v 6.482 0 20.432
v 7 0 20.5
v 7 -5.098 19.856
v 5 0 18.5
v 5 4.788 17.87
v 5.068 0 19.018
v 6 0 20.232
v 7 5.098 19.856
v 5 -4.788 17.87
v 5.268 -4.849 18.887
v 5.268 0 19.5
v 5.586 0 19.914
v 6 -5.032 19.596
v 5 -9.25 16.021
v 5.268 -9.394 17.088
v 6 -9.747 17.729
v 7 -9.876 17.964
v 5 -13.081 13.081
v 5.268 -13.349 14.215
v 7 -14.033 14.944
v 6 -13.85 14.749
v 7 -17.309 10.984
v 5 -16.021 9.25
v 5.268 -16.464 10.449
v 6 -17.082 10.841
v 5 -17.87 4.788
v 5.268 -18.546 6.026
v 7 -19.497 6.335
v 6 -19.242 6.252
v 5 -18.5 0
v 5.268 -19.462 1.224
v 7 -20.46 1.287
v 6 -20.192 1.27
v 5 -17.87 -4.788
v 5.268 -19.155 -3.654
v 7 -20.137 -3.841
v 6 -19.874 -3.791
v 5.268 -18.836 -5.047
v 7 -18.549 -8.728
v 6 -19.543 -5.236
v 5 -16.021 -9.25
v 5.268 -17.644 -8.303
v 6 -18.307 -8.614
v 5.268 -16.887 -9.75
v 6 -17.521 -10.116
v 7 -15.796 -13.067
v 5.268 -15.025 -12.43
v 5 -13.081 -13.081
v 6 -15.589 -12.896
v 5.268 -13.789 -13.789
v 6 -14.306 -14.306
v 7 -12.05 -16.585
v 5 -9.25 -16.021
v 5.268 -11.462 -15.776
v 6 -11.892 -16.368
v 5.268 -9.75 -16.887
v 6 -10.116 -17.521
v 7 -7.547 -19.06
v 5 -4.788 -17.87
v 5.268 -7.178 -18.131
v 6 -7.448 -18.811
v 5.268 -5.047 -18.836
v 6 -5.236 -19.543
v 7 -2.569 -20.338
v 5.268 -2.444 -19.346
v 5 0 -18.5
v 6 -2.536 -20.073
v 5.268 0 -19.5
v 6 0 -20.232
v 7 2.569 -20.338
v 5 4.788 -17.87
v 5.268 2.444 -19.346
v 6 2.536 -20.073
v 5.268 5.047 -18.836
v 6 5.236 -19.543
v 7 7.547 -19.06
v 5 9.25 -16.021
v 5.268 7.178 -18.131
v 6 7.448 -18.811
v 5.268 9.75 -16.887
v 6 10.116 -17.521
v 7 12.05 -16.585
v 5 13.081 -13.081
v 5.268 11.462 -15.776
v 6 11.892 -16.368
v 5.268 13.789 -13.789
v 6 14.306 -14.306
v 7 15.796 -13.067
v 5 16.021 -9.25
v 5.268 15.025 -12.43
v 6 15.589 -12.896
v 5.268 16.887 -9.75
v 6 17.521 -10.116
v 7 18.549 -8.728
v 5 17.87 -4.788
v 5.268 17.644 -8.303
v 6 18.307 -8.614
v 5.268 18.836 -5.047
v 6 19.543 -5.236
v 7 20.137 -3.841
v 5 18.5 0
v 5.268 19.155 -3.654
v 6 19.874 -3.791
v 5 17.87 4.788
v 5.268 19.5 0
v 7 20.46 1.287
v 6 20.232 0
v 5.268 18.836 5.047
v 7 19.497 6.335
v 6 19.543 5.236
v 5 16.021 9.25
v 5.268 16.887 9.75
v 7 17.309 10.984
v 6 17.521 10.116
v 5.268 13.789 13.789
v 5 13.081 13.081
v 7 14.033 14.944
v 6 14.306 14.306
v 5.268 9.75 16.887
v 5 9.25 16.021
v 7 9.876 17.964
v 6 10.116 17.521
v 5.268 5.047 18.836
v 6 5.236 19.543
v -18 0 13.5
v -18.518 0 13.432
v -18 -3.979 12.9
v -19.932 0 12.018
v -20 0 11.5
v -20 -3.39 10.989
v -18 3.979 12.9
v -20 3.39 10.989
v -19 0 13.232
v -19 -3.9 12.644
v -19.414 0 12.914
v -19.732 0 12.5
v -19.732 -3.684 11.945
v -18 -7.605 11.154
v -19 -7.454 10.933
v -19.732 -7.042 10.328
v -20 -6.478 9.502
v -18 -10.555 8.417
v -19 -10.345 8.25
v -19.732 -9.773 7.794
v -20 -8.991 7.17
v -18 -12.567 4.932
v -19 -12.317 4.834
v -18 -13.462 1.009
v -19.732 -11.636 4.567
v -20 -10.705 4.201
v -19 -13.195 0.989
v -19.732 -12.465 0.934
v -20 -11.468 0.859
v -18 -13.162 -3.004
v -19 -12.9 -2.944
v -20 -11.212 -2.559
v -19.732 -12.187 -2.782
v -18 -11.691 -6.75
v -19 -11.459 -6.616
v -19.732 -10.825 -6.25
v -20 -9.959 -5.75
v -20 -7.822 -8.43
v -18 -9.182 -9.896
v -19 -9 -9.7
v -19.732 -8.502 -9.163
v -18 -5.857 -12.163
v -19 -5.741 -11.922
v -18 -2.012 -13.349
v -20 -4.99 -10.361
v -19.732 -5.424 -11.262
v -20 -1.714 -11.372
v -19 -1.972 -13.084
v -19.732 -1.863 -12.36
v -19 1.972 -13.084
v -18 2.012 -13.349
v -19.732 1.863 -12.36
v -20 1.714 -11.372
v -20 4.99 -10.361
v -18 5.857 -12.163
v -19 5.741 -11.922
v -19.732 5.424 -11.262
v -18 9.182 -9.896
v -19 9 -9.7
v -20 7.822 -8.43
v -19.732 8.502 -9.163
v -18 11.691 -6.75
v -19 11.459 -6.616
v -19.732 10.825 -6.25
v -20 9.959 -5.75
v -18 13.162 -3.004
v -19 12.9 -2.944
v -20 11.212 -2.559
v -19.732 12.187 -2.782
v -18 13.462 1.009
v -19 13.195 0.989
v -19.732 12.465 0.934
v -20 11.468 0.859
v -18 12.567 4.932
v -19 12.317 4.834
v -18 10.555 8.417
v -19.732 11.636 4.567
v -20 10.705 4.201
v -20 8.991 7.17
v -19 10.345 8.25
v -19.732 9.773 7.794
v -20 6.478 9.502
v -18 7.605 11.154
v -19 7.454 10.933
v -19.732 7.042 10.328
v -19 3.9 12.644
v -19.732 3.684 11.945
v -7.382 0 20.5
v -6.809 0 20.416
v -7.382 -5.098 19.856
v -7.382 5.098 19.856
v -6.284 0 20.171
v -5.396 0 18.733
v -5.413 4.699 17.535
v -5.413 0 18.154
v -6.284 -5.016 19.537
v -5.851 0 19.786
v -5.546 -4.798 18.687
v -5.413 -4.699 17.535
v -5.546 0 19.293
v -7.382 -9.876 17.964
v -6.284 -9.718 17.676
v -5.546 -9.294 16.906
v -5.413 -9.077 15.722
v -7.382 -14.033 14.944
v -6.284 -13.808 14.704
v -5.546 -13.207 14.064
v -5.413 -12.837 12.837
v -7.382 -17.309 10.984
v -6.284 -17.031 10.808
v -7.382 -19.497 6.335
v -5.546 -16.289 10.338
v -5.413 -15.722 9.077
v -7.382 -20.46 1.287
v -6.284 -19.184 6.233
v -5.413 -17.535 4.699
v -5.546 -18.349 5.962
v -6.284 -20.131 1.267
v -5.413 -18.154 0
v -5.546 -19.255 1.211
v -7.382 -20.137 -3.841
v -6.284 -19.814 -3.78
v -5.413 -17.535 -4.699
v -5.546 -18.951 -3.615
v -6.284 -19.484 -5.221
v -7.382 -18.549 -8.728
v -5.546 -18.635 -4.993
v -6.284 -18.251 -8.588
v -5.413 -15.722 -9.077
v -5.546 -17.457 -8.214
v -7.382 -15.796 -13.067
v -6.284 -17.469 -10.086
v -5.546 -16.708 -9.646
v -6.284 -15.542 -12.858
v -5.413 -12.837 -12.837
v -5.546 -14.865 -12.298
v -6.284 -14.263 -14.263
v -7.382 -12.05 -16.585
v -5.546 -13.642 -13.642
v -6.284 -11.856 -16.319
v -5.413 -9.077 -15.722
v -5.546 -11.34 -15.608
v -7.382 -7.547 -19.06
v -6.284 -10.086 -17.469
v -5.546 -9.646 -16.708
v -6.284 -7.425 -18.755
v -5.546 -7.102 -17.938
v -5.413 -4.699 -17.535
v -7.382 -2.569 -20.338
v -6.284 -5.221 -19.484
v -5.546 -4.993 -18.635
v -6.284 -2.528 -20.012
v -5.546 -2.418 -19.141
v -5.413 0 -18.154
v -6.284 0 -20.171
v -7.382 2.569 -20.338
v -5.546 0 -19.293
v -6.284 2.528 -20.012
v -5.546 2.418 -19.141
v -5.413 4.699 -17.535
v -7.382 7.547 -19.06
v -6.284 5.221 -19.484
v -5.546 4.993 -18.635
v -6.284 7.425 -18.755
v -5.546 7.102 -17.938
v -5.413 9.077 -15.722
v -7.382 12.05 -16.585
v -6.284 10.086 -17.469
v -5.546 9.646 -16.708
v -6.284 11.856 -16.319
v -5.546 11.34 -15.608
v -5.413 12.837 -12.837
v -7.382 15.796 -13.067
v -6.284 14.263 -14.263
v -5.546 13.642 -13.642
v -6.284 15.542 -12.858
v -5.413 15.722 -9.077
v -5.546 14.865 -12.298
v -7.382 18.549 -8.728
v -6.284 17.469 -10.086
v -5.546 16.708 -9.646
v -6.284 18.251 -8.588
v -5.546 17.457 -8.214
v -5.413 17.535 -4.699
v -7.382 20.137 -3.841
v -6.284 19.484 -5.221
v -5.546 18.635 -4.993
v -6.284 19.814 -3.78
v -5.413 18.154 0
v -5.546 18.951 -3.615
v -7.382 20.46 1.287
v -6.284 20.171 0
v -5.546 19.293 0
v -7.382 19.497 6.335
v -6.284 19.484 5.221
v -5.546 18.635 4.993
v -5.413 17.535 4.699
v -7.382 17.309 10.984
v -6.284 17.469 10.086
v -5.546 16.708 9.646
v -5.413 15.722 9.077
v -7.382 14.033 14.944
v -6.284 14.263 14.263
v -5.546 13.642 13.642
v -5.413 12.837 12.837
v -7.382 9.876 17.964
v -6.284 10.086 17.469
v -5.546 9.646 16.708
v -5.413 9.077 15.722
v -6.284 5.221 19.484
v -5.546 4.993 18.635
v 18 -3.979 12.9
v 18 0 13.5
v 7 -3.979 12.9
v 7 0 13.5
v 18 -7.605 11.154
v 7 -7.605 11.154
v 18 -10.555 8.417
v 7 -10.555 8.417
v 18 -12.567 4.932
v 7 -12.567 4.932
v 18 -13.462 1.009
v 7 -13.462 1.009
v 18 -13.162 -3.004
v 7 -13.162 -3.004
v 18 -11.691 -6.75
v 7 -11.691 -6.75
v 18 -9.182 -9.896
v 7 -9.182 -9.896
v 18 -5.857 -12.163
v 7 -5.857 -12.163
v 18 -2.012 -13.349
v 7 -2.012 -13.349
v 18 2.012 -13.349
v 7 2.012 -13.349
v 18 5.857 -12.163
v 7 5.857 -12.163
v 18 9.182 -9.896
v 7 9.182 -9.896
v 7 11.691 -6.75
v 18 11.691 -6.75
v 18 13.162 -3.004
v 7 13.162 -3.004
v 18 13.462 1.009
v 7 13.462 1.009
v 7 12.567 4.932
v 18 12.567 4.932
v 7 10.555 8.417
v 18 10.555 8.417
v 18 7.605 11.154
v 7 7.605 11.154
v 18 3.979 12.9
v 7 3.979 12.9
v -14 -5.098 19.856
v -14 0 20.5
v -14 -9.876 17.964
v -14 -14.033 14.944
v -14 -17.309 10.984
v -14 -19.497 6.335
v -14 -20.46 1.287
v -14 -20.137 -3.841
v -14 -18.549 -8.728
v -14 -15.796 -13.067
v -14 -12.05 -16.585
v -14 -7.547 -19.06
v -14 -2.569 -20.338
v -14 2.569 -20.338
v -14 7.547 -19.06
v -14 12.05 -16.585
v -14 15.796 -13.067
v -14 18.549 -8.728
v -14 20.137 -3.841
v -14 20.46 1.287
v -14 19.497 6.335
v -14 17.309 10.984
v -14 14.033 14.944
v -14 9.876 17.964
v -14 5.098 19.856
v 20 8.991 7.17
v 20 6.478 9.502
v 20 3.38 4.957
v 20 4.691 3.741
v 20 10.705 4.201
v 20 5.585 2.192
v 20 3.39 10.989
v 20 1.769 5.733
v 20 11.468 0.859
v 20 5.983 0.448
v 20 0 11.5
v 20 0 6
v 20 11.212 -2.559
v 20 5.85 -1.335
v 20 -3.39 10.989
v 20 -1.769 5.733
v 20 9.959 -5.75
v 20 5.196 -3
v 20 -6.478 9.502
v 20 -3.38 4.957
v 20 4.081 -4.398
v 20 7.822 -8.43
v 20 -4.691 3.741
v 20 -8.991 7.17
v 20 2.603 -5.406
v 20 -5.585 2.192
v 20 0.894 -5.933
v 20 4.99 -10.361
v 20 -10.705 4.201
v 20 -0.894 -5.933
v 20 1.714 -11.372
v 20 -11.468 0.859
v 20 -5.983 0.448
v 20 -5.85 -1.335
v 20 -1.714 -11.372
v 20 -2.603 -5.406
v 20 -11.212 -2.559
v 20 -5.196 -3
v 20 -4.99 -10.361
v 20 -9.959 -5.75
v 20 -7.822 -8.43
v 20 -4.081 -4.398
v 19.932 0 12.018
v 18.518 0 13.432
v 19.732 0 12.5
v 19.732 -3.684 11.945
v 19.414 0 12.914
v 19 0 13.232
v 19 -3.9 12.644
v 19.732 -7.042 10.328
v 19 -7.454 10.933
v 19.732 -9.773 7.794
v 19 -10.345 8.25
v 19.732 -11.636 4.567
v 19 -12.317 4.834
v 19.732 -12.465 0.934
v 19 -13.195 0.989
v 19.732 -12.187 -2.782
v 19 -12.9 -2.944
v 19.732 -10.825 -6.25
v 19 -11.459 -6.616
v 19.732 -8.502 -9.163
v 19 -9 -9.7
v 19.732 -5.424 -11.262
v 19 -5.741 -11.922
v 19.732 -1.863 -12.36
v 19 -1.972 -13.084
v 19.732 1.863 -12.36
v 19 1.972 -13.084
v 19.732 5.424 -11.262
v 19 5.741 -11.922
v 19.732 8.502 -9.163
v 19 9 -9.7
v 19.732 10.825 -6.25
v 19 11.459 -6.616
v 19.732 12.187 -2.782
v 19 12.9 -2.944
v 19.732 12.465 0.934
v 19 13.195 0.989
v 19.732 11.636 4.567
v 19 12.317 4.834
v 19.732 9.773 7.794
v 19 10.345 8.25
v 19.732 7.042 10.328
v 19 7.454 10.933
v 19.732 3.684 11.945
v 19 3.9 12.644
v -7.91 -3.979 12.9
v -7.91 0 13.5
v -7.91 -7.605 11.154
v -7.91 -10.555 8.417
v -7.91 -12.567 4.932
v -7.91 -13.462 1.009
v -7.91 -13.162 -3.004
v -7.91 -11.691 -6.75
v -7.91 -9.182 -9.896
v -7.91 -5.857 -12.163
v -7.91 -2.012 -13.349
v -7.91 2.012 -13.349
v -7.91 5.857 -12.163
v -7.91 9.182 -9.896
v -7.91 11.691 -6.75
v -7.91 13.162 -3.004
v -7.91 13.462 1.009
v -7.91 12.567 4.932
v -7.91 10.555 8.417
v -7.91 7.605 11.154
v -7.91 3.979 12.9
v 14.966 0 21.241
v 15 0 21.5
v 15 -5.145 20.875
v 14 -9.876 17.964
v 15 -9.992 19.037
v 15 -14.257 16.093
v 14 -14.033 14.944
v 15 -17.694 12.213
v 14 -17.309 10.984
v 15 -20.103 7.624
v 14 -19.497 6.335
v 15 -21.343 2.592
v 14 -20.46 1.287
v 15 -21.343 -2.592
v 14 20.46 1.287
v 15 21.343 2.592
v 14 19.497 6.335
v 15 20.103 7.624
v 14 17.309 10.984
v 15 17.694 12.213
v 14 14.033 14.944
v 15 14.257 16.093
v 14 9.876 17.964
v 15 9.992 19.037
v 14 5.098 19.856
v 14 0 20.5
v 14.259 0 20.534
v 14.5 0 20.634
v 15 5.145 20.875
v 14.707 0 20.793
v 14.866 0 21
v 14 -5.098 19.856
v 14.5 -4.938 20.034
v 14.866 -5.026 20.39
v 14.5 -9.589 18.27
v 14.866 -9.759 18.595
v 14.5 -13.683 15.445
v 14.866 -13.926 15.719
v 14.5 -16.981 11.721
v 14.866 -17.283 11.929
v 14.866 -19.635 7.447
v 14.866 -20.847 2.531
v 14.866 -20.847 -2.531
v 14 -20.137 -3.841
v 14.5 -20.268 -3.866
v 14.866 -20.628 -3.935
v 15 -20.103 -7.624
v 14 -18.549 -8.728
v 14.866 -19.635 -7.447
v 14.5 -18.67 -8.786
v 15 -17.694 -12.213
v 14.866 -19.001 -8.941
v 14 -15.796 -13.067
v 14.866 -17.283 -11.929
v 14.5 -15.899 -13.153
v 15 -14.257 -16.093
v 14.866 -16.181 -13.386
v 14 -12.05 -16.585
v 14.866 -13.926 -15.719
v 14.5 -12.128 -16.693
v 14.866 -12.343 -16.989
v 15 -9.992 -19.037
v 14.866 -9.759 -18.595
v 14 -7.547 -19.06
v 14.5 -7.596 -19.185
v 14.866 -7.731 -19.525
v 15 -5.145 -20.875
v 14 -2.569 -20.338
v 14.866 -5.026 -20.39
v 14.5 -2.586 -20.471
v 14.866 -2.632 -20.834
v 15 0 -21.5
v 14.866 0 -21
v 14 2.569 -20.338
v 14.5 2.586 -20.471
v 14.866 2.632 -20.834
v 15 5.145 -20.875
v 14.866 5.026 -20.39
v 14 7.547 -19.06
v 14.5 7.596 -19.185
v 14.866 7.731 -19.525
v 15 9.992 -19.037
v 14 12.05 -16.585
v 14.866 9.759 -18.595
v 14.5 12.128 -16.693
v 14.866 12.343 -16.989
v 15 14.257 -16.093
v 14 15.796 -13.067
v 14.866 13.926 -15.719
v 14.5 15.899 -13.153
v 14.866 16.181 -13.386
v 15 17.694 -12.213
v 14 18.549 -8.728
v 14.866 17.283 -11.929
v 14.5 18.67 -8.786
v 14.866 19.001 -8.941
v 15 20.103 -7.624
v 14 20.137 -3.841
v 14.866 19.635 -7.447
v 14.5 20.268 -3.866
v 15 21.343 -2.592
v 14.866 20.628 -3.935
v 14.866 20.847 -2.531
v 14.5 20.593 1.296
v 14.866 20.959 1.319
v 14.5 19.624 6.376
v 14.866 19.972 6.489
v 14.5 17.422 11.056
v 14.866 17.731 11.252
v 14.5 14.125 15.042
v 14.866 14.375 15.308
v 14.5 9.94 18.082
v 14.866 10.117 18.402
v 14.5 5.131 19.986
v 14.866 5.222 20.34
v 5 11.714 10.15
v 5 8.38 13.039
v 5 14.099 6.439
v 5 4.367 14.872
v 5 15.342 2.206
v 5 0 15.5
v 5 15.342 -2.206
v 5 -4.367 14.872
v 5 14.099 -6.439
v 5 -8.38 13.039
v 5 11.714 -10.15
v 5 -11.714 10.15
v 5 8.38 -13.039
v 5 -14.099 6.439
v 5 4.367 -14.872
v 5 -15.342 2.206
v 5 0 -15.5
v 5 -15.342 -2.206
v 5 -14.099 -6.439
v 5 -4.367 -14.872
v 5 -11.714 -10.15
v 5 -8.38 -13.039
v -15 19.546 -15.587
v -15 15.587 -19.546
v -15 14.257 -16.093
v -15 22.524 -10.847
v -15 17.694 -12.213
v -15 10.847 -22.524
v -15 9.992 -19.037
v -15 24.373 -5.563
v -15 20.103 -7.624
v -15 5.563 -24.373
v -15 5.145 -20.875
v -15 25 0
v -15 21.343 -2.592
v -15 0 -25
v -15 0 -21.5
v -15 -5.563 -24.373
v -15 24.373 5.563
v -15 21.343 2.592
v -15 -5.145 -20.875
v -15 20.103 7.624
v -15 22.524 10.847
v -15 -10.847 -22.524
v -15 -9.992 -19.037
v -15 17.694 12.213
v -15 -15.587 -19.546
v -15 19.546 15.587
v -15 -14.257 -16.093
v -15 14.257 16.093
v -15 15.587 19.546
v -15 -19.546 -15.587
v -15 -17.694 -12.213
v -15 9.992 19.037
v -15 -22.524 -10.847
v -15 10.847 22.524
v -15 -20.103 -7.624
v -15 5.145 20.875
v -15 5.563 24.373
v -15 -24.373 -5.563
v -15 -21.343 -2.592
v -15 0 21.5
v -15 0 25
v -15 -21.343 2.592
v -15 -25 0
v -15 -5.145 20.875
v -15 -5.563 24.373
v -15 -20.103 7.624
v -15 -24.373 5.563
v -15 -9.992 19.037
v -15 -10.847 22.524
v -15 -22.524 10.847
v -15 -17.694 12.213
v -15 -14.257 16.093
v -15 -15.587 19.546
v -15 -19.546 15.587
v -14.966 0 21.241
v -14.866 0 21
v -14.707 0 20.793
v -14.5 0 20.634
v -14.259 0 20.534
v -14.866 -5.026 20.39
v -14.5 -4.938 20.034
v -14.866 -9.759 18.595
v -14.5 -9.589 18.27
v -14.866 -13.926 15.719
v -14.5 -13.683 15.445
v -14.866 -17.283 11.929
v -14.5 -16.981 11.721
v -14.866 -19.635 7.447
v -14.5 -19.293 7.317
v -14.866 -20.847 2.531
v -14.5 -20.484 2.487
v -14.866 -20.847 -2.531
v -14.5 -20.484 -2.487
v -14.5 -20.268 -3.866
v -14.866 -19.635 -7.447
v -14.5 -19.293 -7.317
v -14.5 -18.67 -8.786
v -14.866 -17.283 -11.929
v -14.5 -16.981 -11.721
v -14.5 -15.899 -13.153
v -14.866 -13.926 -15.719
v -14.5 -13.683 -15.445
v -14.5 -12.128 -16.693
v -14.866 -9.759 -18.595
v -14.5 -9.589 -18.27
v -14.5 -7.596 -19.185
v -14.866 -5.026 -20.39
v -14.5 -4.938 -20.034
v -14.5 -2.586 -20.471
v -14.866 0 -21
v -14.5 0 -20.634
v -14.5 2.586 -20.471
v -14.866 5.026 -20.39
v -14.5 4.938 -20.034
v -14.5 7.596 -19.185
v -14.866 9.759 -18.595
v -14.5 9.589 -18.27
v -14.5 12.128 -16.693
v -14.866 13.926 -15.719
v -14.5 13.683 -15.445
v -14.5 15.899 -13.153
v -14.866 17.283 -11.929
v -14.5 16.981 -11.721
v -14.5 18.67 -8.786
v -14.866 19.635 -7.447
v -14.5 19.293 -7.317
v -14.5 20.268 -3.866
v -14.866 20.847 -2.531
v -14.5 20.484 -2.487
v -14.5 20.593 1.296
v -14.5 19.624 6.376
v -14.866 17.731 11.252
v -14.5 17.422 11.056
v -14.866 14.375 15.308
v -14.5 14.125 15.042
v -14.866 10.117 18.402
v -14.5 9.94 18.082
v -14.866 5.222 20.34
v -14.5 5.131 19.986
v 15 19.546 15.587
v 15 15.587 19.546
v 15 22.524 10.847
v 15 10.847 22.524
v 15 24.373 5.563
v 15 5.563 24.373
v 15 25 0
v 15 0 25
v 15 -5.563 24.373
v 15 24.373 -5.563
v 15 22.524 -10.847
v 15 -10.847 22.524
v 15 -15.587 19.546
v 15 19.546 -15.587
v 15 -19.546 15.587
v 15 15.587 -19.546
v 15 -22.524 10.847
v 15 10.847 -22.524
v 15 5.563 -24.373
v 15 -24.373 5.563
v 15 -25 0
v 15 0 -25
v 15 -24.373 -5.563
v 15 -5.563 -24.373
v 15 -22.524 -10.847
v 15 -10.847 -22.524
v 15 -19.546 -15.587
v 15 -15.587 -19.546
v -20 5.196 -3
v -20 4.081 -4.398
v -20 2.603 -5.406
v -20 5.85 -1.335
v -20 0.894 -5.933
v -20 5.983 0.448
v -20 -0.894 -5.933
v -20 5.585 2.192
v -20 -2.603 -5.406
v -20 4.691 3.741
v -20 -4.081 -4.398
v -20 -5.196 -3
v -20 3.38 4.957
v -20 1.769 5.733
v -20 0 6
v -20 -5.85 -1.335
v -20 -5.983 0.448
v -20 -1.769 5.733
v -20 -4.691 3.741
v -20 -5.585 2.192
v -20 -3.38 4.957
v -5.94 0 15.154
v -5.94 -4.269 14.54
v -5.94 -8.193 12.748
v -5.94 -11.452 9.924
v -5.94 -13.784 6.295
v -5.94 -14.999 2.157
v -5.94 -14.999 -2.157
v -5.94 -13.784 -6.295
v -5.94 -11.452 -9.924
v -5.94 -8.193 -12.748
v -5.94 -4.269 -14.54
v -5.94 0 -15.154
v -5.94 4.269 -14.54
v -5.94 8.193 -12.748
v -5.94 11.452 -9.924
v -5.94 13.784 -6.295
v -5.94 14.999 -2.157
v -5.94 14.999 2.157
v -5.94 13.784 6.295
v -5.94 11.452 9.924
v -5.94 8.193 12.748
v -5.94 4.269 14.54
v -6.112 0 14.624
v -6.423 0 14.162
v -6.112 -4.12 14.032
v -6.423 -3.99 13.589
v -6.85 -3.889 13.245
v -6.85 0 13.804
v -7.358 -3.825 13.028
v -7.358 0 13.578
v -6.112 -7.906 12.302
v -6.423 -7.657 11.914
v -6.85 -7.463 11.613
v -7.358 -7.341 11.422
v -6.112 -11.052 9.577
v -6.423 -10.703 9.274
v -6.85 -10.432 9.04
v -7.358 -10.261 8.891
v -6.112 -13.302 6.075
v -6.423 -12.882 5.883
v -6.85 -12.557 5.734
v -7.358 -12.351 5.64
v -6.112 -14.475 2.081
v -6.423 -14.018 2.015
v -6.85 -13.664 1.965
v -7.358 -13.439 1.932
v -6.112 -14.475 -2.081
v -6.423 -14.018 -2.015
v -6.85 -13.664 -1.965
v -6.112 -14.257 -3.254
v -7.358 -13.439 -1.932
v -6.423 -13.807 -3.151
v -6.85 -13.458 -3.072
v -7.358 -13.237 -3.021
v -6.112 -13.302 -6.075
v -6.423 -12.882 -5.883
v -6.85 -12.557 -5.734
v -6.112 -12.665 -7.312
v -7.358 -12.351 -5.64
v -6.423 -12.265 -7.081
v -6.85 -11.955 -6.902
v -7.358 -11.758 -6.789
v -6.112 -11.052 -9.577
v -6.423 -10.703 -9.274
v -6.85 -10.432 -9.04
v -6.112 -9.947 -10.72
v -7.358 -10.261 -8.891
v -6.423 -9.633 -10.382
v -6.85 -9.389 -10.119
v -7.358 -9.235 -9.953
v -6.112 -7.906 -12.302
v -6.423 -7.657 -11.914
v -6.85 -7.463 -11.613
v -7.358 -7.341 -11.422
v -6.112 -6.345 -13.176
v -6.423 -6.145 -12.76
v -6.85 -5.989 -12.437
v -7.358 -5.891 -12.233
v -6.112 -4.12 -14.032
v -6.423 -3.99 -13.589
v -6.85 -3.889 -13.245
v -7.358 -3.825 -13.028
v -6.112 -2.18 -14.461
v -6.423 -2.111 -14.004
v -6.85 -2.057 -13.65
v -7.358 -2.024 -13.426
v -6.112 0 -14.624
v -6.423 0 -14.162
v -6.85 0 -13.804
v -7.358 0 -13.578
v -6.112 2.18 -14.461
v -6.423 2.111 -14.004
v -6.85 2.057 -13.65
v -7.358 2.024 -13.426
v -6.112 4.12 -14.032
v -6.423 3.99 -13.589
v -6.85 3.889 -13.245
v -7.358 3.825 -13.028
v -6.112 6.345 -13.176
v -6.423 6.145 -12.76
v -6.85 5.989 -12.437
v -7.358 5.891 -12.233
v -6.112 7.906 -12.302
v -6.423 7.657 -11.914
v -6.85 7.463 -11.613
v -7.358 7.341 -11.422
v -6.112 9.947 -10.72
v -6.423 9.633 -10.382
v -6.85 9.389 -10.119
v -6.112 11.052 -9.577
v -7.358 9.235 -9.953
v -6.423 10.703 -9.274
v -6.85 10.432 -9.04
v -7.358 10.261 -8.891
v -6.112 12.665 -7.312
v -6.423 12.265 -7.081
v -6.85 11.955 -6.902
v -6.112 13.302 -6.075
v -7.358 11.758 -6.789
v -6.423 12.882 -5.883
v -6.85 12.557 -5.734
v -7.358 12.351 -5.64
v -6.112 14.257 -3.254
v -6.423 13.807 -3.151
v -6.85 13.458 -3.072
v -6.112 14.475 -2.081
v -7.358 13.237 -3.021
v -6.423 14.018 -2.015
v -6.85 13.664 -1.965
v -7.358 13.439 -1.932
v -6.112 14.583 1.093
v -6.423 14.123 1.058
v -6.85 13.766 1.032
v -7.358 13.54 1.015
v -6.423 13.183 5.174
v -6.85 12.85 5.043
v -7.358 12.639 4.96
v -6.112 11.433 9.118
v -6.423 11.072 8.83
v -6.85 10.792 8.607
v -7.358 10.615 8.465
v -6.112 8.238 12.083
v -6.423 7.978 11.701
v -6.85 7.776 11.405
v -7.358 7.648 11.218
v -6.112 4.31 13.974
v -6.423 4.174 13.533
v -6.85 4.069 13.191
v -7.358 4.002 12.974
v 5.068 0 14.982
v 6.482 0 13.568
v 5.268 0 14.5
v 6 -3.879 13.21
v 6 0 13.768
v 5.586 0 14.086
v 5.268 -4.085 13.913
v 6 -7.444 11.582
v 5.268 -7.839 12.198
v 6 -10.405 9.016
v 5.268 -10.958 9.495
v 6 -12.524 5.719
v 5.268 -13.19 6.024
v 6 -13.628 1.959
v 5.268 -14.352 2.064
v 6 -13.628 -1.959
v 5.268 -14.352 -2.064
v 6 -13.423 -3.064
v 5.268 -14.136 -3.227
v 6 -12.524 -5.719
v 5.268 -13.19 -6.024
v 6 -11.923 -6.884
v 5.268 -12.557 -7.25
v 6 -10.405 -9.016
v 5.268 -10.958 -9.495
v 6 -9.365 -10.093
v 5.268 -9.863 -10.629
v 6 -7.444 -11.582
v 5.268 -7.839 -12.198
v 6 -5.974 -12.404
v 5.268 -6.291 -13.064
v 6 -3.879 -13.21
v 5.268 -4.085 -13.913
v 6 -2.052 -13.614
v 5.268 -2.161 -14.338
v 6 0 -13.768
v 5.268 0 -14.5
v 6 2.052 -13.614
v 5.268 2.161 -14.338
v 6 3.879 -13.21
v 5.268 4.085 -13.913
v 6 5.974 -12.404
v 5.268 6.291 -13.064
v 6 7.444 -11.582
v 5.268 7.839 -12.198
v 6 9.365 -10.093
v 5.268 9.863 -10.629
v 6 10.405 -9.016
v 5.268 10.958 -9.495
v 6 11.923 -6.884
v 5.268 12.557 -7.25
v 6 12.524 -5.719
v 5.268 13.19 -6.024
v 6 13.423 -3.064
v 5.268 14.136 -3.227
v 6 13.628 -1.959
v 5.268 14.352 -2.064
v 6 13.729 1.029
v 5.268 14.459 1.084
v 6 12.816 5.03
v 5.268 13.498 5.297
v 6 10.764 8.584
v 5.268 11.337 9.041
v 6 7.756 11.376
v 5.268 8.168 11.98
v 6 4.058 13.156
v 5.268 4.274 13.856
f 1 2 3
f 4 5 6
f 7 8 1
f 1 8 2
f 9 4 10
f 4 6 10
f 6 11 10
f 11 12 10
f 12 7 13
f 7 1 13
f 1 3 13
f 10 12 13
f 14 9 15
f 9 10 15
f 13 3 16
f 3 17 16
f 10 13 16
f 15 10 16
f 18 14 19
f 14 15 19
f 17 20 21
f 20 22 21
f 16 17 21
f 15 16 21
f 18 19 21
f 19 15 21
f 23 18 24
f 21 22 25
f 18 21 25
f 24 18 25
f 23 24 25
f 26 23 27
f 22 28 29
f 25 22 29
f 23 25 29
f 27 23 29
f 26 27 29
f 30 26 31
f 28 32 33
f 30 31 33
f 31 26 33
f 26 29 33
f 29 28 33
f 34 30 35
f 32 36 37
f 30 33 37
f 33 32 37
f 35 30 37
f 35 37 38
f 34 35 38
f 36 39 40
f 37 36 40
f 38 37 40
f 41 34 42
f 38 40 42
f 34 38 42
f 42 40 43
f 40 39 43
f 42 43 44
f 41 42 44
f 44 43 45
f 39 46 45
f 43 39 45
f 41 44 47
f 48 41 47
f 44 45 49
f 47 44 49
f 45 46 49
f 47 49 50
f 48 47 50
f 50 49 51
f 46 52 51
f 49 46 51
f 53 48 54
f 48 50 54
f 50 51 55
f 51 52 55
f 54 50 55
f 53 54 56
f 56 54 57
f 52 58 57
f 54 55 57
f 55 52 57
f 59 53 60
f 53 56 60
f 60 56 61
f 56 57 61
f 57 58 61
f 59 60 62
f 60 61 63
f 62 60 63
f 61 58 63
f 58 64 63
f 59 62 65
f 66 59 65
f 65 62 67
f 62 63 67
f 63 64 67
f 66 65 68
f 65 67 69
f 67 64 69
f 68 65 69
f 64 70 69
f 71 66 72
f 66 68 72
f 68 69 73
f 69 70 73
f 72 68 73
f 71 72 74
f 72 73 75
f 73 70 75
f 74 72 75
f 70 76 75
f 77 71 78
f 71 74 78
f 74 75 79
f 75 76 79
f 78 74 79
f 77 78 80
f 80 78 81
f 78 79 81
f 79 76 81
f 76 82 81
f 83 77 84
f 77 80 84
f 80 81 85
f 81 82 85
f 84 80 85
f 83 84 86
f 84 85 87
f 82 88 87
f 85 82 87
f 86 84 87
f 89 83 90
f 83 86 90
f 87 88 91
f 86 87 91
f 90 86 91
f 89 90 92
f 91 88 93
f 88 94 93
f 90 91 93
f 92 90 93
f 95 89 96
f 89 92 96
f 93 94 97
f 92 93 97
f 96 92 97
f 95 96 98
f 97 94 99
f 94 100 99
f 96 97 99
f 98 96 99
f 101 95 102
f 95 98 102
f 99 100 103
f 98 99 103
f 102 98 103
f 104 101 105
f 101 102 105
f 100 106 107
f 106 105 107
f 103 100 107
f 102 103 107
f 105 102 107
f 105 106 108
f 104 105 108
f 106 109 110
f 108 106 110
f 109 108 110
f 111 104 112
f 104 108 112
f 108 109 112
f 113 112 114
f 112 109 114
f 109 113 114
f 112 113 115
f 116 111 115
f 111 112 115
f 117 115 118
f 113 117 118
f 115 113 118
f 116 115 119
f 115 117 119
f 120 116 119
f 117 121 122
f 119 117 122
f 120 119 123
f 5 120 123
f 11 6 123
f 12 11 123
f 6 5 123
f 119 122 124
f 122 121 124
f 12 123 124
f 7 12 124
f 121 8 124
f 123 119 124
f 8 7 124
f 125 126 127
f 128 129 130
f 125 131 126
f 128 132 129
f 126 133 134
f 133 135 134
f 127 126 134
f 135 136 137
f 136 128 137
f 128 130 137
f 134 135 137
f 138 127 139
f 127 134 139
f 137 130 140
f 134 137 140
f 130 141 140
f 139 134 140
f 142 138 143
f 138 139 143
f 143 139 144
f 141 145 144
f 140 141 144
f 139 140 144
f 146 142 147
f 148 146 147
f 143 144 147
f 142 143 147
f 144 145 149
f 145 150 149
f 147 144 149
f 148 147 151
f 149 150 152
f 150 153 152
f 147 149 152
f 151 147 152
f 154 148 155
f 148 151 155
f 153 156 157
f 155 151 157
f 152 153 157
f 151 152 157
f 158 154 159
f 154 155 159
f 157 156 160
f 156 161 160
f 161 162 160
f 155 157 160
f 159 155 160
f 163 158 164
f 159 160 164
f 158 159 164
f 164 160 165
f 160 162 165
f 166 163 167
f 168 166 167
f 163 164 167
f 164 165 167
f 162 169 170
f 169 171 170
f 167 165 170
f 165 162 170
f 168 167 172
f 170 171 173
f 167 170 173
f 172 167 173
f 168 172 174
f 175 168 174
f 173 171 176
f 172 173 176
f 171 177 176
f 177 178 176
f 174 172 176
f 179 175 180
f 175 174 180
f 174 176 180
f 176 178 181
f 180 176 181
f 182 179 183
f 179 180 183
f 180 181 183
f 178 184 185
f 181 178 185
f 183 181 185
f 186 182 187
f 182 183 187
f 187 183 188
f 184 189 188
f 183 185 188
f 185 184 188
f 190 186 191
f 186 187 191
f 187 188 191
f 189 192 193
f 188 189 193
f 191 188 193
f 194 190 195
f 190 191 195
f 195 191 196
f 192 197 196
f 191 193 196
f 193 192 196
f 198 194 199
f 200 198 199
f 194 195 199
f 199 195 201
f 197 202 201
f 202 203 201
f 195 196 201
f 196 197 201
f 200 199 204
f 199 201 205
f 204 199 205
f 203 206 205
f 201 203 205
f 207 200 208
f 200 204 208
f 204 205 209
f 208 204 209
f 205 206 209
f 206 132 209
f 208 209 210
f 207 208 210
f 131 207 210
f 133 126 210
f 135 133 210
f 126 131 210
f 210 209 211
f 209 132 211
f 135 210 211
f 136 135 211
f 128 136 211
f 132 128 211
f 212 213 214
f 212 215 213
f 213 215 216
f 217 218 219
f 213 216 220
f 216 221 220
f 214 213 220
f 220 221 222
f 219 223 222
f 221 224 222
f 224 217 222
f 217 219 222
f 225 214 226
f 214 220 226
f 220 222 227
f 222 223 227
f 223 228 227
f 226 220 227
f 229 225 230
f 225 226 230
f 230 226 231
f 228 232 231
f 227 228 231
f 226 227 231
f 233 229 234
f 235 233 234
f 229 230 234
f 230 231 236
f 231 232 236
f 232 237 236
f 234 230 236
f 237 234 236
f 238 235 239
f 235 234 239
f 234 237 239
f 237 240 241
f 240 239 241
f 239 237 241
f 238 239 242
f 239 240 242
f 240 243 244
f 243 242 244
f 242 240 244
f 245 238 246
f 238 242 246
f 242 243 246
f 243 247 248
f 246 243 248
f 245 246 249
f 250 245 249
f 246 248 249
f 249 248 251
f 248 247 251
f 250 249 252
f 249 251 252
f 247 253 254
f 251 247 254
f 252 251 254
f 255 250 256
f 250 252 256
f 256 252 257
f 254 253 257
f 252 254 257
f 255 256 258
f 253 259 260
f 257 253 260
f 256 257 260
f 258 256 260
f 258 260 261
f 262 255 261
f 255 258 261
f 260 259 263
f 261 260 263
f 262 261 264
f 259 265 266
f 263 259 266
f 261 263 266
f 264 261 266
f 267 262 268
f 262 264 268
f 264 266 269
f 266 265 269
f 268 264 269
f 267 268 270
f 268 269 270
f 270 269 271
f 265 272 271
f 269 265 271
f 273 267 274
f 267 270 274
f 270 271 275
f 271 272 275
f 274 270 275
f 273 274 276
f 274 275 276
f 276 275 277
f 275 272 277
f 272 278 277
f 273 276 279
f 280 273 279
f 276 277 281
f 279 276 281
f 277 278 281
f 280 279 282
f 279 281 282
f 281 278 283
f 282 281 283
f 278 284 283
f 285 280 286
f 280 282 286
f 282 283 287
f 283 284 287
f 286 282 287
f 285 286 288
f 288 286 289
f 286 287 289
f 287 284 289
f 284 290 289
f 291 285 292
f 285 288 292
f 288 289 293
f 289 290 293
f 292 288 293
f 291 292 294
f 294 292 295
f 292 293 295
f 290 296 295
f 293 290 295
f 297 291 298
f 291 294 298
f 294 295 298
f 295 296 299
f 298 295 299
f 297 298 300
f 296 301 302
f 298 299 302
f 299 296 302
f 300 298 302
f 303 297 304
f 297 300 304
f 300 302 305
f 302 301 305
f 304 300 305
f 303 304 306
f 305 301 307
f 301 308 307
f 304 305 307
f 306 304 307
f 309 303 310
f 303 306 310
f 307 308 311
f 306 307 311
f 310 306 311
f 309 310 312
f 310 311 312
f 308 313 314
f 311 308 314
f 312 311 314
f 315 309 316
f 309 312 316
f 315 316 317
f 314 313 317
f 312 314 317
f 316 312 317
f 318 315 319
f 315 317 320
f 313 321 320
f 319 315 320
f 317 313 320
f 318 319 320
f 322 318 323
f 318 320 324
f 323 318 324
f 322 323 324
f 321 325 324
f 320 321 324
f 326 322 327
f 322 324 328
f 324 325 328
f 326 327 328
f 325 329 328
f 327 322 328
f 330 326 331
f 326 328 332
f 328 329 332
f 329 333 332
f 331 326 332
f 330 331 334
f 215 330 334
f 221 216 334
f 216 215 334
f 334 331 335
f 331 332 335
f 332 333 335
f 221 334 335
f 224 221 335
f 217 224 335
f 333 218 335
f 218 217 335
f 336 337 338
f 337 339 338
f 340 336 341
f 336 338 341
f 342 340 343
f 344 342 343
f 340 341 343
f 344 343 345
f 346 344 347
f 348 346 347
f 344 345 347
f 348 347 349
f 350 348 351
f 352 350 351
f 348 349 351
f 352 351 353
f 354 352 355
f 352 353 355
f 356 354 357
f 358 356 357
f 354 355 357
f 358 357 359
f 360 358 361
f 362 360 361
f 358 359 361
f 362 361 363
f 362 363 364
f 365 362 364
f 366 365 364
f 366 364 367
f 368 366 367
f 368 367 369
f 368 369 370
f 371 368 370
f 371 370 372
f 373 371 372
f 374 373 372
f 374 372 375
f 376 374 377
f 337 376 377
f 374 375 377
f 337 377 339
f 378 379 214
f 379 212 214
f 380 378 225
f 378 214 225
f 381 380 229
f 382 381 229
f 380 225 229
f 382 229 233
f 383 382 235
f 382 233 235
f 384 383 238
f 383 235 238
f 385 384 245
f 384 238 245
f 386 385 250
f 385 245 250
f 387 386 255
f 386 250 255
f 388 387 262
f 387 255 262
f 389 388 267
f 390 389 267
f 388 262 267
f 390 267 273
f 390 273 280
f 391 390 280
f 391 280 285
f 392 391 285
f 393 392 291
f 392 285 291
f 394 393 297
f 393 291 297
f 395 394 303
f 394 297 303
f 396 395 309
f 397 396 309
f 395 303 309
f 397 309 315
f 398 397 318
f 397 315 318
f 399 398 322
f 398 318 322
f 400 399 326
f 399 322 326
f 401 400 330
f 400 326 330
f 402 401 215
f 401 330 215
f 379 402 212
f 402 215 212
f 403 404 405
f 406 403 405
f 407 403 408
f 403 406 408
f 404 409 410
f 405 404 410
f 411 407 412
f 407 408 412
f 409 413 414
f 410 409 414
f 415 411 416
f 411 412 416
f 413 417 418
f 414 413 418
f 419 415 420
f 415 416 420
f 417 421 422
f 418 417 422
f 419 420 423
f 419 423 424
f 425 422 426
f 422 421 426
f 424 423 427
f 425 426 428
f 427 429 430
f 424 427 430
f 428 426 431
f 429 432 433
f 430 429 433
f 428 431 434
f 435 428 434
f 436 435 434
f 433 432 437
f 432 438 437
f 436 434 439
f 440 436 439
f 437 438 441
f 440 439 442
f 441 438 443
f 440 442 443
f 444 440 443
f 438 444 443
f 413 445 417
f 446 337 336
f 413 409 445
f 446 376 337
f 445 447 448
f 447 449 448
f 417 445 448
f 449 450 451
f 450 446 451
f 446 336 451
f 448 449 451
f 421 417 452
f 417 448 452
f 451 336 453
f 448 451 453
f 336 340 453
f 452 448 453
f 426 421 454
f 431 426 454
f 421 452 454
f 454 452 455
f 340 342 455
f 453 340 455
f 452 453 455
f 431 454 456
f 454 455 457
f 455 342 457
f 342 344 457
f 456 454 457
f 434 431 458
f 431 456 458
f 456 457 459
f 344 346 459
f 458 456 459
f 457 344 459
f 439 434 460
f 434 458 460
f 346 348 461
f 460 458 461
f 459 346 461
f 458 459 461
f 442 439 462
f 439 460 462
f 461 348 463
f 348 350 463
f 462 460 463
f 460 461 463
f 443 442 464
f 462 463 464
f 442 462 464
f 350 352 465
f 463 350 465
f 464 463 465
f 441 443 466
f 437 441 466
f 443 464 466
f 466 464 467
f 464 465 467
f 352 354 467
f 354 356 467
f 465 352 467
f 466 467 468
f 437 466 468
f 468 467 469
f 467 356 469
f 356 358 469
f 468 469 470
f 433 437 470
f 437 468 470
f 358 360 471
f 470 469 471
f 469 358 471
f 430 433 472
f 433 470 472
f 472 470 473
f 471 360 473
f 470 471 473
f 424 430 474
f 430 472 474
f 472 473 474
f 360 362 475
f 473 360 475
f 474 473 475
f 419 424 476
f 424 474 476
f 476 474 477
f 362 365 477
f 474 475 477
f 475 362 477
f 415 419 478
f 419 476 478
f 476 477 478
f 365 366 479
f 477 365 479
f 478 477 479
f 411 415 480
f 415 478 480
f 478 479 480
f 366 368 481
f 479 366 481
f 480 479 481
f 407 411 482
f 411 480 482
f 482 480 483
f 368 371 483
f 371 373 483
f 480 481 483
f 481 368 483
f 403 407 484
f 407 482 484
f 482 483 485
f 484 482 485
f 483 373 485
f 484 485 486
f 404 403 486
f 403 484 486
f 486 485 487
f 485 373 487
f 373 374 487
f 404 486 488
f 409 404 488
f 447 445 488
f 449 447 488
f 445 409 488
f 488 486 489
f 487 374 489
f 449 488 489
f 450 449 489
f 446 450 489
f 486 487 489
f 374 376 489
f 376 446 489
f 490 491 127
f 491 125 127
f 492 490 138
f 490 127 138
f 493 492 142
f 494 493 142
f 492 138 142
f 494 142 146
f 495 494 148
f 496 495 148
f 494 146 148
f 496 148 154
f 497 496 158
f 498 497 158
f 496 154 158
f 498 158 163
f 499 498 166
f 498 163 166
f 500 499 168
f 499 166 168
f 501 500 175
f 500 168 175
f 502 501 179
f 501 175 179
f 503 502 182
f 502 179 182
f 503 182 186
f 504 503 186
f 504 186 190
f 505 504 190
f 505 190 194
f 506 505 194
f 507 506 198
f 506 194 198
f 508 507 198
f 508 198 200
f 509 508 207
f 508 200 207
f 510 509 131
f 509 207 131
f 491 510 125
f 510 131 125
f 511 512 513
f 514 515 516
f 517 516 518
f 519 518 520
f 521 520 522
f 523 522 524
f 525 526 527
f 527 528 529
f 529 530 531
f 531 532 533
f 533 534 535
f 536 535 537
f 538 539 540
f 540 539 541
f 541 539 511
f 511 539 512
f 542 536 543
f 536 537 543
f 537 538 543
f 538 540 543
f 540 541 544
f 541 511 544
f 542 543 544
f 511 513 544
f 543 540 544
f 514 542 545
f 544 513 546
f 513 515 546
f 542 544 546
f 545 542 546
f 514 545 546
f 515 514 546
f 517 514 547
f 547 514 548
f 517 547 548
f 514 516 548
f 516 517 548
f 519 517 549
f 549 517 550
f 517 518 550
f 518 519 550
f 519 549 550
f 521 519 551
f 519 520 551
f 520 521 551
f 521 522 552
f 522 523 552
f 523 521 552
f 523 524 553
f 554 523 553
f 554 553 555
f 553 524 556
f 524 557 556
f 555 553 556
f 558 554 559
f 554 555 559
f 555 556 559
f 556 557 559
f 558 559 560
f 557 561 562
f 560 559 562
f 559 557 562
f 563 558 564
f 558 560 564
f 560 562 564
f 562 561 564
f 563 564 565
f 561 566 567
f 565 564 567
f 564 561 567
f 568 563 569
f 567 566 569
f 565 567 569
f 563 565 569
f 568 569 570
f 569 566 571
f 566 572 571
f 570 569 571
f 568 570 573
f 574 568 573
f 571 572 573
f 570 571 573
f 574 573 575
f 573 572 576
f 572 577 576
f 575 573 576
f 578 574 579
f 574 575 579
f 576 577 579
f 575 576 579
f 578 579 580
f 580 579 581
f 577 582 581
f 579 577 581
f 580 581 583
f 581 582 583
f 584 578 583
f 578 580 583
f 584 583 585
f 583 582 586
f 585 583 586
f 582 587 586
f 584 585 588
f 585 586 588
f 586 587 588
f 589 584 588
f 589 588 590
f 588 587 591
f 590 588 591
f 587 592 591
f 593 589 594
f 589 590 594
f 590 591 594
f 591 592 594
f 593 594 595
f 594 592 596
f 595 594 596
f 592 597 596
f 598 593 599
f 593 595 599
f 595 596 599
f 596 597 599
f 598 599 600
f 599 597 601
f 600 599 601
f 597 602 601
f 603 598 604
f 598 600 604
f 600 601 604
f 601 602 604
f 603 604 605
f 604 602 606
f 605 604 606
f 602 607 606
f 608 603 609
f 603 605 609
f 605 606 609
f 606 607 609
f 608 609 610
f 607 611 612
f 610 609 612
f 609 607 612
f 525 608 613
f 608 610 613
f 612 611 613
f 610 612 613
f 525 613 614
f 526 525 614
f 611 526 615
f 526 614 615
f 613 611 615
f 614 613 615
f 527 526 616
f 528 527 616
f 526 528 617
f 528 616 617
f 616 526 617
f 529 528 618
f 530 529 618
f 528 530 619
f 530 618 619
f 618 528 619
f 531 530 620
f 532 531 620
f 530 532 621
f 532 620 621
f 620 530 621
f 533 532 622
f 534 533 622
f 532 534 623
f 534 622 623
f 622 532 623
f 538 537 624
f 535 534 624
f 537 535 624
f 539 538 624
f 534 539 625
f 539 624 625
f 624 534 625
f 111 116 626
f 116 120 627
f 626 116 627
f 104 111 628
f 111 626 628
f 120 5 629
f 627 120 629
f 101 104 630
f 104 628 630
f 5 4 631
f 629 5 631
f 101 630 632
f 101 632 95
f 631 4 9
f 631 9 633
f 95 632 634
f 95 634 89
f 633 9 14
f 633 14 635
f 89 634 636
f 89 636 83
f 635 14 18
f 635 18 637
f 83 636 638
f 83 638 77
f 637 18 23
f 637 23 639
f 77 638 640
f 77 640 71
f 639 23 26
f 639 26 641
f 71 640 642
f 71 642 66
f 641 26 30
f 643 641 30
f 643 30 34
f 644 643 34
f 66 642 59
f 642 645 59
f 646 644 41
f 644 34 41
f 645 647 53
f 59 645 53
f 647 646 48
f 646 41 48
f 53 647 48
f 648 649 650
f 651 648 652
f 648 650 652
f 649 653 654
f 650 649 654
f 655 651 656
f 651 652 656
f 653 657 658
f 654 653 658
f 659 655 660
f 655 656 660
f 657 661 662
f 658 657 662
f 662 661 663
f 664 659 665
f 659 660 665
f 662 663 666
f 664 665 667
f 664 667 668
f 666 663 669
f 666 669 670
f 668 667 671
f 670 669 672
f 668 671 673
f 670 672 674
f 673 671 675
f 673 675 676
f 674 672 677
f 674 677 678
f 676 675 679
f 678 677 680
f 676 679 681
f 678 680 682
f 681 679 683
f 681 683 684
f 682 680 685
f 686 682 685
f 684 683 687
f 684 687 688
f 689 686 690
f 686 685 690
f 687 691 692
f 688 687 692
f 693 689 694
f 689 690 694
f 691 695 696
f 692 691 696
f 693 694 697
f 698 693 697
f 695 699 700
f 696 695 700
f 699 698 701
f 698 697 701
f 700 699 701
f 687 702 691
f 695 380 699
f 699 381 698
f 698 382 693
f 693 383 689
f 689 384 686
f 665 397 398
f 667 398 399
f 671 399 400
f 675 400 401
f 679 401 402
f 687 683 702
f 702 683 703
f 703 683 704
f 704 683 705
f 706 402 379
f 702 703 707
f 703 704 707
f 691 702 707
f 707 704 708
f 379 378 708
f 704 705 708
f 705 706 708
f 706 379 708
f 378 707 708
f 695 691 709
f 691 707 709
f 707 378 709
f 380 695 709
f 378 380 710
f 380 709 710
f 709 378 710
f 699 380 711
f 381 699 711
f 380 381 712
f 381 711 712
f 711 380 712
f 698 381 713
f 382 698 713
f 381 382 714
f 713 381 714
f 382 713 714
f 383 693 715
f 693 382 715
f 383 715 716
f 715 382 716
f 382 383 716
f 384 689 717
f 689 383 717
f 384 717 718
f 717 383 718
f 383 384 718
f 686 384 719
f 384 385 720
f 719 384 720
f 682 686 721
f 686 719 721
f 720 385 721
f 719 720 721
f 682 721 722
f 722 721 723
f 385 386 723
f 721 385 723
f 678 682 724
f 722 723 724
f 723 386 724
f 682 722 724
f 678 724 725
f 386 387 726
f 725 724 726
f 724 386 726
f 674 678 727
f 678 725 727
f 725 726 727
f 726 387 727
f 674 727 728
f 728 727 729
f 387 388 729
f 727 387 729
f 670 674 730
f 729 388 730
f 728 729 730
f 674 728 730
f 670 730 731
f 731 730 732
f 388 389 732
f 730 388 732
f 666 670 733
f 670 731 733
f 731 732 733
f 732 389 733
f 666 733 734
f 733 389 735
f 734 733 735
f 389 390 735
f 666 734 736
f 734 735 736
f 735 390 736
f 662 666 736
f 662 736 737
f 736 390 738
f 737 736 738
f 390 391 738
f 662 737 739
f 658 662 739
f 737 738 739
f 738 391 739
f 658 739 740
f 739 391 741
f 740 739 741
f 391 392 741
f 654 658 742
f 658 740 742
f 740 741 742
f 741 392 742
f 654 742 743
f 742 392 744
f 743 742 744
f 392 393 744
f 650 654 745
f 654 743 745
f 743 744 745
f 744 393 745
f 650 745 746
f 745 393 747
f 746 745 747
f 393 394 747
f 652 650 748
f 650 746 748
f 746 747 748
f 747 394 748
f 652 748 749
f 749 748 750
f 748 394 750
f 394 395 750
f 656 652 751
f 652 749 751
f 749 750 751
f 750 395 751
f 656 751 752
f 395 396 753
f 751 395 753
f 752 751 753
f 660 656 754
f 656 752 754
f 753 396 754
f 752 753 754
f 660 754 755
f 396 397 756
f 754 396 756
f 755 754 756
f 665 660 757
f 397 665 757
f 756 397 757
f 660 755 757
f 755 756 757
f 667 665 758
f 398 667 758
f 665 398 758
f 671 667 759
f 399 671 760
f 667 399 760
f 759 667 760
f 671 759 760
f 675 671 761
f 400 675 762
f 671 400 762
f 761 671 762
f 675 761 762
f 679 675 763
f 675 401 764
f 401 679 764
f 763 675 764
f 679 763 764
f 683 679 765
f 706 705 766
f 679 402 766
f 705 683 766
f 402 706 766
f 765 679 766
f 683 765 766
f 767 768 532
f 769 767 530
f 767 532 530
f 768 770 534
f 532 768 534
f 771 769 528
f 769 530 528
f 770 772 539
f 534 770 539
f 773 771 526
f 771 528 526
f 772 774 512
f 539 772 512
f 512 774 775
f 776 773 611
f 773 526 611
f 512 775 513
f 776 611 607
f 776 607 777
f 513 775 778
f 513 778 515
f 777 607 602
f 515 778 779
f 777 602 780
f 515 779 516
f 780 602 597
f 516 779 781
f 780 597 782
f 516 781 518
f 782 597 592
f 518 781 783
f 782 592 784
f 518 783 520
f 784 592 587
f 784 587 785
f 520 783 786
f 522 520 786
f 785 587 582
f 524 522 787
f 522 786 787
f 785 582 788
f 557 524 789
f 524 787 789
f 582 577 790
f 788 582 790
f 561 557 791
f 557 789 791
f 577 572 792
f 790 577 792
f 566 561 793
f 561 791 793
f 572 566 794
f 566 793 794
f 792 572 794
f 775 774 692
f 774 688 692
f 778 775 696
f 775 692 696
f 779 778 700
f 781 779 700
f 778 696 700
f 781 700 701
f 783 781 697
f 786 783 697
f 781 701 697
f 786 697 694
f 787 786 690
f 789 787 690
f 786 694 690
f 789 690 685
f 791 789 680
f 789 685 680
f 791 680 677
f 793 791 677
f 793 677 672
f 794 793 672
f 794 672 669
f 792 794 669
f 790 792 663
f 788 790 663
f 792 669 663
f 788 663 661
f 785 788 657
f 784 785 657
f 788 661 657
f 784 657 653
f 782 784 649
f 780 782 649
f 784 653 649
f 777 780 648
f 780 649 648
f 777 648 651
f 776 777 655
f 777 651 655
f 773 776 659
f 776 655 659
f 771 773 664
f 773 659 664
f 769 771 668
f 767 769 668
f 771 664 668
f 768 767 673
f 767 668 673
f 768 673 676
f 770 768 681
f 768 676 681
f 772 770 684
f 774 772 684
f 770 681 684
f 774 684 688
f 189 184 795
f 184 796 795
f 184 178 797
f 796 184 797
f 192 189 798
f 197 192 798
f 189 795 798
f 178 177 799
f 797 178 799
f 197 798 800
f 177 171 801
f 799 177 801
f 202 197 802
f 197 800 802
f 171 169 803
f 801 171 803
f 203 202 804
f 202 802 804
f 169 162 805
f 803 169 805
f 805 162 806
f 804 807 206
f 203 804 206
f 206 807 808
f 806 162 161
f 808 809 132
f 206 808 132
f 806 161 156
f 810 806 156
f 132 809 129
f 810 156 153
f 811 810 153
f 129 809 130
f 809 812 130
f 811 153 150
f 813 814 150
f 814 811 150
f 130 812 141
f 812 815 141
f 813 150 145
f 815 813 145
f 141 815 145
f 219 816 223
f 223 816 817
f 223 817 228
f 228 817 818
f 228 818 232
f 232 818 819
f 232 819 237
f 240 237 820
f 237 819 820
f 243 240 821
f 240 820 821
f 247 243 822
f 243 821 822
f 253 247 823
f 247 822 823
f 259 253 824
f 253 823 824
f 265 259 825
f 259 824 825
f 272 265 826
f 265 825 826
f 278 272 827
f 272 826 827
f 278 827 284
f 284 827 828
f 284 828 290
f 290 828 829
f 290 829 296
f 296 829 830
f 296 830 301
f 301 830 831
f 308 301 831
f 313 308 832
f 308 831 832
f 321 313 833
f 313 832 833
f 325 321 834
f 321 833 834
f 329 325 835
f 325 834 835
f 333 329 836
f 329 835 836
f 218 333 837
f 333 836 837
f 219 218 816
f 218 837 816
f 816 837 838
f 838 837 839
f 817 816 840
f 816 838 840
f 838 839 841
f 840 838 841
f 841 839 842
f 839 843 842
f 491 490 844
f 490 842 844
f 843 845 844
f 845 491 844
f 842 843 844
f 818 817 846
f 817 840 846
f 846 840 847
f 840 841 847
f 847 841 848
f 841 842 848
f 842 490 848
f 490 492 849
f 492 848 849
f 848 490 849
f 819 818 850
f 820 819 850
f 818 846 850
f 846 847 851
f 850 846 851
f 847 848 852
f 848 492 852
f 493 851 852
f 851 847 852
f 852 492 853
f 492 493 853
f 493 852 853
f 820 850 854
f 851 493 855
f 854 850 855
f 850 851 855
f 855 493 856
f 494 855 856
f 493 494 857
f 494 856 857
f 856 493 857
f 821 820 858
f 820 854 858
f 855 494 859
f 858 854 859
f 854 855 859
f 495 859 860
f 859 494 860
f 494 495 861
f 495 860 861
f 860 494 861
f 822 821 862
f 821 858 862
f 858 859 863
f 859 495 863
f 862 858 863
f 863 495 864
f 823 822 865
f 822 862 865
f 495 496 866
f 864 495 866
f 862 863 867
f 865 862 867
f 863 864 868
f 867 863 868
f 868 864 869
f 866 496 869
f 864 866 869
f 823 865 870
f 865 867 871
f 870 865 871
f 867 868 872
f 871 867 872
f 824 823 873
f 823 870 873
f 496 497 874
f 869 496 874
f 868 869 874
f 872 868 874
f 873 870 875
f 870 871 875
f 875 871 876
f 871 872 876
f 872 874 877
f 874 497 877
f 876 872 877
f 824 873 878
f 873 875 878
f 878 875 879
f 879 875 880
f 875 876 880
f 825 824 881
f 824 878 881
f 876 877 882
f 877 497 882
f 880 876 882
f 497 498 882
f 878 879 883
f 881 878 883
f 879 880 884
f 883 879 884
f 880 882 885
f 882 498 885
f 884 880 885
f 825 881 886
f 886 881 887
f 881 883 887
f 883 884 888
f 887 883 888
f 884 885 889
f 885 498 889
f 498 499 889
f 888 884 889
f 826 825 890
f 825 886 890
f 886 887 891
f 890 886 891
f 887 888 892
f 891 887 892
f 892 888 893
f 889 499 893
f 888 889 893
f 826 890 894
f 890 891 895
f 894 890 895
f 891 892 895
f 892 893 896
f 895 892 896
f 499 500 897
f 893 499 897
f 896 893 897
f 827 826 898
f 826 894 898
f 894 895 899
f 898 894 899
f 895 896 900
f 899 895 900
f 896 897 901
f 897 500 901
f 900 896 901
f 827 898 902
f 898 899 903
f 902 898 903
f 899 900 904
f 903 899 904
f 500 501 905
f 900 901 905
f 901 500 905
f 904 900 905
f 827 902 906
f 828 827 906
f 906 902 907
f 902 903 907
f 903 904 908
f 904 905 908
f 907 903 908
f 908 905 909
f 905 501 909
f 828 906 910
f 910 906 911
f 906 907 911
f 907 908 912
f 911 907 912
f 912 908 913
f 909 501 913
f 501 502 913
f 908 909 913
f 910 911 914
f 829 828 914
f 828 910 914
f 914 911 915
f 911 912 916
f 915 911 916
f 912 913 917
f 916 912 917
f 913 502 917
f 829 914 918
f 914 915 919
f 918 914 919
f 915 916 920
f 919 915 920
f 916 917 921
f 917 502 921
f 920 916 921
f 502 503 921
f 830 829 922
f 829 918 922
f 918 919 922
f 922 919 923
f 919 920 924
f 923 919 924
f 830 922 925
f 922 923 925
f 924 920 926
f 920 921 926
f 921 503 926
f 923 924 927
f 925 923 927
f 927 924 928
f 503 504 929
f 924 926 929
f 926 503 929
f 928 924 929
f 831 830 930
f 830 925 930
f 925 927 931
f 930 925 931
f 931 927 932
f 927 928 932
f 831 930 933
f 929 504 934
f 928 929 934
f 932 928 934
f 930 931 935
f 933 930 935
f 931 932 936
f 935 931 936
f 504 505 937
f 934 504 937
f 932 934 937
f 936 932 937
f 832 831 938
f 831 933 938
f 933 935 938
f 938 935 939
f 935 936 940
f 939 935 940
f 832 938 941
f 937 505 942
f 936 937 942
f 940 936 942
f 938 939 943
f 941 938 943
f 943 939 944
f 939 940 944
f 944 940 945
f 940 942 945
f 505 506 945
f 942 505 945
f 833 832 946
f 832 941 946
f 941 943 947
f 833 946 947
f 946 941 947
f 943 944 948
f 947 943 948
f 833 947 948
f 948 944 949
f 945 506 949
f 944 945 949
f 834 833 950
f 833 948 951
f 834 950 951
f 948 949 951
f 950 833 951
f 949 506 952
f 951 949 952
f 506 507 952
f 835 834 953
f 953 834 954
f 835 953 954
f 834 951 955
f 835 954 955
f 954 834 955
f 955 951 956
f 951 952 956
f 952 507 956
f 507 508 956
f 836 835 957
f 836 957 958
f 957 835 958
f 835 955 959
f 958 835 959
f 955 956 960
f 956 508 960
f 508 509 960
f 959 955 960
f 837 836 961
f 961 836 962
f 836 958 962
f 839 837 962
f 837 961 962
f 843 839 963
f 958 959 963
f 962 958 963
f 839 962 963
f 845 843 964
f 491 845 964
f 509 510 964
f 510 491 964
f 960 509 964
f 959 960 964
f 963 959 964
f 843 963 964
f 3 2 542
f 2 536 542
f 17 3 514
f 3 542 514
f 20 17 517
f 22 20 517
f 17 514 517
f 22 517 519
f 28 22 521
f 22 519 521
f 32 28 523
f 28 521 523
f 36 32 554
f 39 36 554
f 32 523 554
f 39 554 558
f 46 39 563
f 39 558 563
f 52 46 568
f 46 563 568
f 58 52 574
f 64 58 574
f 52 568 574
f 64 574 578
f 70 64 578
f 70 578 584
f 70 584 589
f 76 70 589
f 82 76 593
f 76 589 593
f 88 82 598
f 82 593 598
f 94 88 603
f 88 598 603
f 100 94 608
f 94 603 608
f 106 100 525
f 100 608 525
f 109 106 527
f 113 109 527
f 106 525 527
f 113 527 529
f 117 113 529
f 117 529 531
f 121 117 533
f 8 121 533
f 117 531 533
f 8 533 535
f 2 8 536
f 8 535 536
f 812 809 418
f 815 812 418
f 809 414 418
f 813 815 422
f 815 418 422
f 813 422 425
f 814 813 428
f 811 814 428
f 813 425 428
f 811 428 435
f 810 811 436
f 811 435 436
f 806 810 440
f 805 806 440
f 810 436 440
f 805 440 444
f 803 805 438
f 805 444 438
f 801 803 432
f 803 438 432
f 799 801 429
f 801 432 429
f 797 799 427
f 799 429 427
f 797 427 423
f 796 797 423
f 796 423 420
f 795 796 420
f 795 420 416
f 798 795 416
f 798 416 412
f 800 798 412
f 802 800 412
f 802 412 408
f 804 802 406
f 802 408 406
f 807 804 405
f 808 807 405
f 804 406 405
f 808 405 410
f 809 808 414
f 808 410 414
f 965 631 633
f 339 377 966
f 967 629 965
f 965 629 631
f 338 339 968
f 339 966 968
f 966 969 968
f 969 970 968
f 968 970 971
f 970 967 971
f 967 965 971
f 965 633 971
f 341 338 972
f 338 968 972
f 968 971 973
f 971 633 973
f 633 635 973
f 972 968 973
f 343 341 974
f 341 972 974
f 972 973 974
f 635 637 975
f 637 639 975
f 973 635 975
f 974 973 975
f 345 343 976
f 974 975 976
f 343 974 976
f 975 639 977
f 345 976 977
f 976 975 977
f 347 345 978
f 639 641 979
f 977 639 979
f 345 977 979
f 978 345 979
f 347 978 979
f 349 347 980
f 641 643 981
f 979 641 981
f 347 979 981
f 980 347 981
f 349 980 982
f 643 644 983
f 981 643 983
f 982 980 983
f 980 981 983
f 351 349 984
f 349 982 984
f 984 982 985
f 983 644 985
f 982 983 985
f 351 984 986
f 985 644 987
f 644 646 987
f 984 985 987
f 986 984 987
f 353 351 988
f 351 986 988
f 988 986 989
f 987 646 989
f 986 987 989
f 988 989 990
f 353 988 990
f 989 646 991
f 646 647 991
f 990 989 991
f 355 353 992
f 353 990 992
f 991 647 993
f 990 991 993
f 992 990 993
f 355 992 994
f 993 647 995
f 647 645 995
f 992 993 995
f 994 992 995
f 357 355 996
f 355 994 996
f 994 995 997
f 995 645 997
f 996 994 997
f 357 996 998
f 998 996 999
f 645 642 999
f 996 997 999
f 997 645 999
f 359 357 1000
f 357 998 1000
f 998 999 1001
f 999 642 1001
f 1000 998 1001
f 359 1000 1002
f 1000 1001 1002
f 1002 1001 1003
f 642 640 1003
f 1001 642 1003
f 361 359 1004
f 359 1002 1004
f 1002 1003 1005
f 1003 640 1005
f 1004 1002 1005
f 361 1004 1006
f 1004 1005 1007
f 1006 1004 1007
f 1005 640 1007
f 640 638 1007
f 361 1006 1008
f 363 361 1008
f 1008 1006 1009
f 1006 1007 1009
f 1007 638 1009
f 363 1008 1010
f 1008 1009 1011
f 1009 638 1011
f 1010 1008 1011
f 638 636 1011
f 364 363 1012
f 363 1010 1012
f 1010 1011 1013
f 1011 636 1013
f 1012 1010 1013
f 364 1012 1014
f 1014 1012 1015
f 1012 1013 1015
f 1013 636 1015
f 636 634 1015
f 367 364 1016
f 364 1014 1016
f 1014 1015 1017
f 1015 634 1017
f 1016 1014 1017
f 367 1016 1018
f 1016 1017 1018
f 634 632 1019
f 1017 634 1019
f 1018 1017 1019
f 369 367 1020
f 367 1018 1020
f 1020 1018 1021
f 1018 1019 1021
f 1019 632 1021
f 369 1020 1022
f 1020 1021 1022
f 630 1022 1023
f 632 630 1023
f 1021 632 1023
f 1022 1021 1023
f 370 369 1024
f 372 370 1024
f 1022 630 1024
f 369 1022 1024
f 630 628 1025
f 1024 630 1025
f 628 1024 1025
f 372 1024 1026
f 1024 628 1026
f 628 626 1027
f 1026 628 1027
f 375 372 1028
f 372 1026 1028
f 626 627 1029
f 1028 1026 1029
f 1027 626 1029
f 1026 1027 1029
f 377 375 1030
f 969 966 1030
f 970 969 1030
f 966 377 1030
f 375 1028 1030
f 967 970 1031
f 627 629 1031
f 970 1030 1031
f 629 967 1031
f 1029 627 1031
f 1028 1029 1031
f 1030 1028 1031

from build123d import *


with BuildPart() as part:
    # Эскиз1 → Повернуть1 (revolve)
    with BuildSketch(Plane.XY, mode=Mode.PRIVATE) as revolve_1_sk:
        with BuildLine():
            Line((-20, 6), (20, 6))
            Line((20, 6), (20, 11.5))
            ThreePointArc((20, 11.5), (19.414213562, 12.914213562), (18, 13.5))
            Line((18, 13.5), (7, 13.5))
            ThreePointArc((7, 13.5), (5.585786438, 14.085786438), (5, 15.5))
            Line((5, 15.5), (5, 18.5))
            ThreePointArc((5, 18.5), (5.585786438, 19.914213562), (7, 20.5))
            Line((7, 20.5), (14, 20.5))
            ThreePointArc((14, 20.5), (14.707106781, 20.792893219), (15, 21.5))
            Line((15, 21.5), (15, 25))
            Line((15, 25), (-15, 25))
            Line((-15, 25), (-15, 21.5))
            ThreePointArc((-15, 21.5), (-14.707106781, 20.792893219), (-14, 20.5))
            Line((-14, 20.5), (-7.382327195, 20.5))
            ThreePointArc((-7.382327195, 20.5), (-5.850551832, 19.78594877), (-5.412542551, 18.153664239))
            Line((-5.412542551, 18.153664239), (-5.940015079, 15.153664239))
            ThreePointArc((-5.940015079, 15.153664239), (-6.623850952, 13.968224637), (-7.909799722, 13.5))
            Line((-7.909799722, 13.5), (-18, 13.5))
            ThreePointArc((-18, 13.5), (-19.414213562, 12.914213562), (-20, 11.5))
            Line((-20, 11.5), (-20, 6))
        make_face()
    revolve(revolve_1_sk.sketch.rotate(Axis((-52.382147487, 0, 0), (1, 0, 0)), 90), axis=Axis((-52.382147487, 0, 0), (1, 0, 0)))


solid = part.part
